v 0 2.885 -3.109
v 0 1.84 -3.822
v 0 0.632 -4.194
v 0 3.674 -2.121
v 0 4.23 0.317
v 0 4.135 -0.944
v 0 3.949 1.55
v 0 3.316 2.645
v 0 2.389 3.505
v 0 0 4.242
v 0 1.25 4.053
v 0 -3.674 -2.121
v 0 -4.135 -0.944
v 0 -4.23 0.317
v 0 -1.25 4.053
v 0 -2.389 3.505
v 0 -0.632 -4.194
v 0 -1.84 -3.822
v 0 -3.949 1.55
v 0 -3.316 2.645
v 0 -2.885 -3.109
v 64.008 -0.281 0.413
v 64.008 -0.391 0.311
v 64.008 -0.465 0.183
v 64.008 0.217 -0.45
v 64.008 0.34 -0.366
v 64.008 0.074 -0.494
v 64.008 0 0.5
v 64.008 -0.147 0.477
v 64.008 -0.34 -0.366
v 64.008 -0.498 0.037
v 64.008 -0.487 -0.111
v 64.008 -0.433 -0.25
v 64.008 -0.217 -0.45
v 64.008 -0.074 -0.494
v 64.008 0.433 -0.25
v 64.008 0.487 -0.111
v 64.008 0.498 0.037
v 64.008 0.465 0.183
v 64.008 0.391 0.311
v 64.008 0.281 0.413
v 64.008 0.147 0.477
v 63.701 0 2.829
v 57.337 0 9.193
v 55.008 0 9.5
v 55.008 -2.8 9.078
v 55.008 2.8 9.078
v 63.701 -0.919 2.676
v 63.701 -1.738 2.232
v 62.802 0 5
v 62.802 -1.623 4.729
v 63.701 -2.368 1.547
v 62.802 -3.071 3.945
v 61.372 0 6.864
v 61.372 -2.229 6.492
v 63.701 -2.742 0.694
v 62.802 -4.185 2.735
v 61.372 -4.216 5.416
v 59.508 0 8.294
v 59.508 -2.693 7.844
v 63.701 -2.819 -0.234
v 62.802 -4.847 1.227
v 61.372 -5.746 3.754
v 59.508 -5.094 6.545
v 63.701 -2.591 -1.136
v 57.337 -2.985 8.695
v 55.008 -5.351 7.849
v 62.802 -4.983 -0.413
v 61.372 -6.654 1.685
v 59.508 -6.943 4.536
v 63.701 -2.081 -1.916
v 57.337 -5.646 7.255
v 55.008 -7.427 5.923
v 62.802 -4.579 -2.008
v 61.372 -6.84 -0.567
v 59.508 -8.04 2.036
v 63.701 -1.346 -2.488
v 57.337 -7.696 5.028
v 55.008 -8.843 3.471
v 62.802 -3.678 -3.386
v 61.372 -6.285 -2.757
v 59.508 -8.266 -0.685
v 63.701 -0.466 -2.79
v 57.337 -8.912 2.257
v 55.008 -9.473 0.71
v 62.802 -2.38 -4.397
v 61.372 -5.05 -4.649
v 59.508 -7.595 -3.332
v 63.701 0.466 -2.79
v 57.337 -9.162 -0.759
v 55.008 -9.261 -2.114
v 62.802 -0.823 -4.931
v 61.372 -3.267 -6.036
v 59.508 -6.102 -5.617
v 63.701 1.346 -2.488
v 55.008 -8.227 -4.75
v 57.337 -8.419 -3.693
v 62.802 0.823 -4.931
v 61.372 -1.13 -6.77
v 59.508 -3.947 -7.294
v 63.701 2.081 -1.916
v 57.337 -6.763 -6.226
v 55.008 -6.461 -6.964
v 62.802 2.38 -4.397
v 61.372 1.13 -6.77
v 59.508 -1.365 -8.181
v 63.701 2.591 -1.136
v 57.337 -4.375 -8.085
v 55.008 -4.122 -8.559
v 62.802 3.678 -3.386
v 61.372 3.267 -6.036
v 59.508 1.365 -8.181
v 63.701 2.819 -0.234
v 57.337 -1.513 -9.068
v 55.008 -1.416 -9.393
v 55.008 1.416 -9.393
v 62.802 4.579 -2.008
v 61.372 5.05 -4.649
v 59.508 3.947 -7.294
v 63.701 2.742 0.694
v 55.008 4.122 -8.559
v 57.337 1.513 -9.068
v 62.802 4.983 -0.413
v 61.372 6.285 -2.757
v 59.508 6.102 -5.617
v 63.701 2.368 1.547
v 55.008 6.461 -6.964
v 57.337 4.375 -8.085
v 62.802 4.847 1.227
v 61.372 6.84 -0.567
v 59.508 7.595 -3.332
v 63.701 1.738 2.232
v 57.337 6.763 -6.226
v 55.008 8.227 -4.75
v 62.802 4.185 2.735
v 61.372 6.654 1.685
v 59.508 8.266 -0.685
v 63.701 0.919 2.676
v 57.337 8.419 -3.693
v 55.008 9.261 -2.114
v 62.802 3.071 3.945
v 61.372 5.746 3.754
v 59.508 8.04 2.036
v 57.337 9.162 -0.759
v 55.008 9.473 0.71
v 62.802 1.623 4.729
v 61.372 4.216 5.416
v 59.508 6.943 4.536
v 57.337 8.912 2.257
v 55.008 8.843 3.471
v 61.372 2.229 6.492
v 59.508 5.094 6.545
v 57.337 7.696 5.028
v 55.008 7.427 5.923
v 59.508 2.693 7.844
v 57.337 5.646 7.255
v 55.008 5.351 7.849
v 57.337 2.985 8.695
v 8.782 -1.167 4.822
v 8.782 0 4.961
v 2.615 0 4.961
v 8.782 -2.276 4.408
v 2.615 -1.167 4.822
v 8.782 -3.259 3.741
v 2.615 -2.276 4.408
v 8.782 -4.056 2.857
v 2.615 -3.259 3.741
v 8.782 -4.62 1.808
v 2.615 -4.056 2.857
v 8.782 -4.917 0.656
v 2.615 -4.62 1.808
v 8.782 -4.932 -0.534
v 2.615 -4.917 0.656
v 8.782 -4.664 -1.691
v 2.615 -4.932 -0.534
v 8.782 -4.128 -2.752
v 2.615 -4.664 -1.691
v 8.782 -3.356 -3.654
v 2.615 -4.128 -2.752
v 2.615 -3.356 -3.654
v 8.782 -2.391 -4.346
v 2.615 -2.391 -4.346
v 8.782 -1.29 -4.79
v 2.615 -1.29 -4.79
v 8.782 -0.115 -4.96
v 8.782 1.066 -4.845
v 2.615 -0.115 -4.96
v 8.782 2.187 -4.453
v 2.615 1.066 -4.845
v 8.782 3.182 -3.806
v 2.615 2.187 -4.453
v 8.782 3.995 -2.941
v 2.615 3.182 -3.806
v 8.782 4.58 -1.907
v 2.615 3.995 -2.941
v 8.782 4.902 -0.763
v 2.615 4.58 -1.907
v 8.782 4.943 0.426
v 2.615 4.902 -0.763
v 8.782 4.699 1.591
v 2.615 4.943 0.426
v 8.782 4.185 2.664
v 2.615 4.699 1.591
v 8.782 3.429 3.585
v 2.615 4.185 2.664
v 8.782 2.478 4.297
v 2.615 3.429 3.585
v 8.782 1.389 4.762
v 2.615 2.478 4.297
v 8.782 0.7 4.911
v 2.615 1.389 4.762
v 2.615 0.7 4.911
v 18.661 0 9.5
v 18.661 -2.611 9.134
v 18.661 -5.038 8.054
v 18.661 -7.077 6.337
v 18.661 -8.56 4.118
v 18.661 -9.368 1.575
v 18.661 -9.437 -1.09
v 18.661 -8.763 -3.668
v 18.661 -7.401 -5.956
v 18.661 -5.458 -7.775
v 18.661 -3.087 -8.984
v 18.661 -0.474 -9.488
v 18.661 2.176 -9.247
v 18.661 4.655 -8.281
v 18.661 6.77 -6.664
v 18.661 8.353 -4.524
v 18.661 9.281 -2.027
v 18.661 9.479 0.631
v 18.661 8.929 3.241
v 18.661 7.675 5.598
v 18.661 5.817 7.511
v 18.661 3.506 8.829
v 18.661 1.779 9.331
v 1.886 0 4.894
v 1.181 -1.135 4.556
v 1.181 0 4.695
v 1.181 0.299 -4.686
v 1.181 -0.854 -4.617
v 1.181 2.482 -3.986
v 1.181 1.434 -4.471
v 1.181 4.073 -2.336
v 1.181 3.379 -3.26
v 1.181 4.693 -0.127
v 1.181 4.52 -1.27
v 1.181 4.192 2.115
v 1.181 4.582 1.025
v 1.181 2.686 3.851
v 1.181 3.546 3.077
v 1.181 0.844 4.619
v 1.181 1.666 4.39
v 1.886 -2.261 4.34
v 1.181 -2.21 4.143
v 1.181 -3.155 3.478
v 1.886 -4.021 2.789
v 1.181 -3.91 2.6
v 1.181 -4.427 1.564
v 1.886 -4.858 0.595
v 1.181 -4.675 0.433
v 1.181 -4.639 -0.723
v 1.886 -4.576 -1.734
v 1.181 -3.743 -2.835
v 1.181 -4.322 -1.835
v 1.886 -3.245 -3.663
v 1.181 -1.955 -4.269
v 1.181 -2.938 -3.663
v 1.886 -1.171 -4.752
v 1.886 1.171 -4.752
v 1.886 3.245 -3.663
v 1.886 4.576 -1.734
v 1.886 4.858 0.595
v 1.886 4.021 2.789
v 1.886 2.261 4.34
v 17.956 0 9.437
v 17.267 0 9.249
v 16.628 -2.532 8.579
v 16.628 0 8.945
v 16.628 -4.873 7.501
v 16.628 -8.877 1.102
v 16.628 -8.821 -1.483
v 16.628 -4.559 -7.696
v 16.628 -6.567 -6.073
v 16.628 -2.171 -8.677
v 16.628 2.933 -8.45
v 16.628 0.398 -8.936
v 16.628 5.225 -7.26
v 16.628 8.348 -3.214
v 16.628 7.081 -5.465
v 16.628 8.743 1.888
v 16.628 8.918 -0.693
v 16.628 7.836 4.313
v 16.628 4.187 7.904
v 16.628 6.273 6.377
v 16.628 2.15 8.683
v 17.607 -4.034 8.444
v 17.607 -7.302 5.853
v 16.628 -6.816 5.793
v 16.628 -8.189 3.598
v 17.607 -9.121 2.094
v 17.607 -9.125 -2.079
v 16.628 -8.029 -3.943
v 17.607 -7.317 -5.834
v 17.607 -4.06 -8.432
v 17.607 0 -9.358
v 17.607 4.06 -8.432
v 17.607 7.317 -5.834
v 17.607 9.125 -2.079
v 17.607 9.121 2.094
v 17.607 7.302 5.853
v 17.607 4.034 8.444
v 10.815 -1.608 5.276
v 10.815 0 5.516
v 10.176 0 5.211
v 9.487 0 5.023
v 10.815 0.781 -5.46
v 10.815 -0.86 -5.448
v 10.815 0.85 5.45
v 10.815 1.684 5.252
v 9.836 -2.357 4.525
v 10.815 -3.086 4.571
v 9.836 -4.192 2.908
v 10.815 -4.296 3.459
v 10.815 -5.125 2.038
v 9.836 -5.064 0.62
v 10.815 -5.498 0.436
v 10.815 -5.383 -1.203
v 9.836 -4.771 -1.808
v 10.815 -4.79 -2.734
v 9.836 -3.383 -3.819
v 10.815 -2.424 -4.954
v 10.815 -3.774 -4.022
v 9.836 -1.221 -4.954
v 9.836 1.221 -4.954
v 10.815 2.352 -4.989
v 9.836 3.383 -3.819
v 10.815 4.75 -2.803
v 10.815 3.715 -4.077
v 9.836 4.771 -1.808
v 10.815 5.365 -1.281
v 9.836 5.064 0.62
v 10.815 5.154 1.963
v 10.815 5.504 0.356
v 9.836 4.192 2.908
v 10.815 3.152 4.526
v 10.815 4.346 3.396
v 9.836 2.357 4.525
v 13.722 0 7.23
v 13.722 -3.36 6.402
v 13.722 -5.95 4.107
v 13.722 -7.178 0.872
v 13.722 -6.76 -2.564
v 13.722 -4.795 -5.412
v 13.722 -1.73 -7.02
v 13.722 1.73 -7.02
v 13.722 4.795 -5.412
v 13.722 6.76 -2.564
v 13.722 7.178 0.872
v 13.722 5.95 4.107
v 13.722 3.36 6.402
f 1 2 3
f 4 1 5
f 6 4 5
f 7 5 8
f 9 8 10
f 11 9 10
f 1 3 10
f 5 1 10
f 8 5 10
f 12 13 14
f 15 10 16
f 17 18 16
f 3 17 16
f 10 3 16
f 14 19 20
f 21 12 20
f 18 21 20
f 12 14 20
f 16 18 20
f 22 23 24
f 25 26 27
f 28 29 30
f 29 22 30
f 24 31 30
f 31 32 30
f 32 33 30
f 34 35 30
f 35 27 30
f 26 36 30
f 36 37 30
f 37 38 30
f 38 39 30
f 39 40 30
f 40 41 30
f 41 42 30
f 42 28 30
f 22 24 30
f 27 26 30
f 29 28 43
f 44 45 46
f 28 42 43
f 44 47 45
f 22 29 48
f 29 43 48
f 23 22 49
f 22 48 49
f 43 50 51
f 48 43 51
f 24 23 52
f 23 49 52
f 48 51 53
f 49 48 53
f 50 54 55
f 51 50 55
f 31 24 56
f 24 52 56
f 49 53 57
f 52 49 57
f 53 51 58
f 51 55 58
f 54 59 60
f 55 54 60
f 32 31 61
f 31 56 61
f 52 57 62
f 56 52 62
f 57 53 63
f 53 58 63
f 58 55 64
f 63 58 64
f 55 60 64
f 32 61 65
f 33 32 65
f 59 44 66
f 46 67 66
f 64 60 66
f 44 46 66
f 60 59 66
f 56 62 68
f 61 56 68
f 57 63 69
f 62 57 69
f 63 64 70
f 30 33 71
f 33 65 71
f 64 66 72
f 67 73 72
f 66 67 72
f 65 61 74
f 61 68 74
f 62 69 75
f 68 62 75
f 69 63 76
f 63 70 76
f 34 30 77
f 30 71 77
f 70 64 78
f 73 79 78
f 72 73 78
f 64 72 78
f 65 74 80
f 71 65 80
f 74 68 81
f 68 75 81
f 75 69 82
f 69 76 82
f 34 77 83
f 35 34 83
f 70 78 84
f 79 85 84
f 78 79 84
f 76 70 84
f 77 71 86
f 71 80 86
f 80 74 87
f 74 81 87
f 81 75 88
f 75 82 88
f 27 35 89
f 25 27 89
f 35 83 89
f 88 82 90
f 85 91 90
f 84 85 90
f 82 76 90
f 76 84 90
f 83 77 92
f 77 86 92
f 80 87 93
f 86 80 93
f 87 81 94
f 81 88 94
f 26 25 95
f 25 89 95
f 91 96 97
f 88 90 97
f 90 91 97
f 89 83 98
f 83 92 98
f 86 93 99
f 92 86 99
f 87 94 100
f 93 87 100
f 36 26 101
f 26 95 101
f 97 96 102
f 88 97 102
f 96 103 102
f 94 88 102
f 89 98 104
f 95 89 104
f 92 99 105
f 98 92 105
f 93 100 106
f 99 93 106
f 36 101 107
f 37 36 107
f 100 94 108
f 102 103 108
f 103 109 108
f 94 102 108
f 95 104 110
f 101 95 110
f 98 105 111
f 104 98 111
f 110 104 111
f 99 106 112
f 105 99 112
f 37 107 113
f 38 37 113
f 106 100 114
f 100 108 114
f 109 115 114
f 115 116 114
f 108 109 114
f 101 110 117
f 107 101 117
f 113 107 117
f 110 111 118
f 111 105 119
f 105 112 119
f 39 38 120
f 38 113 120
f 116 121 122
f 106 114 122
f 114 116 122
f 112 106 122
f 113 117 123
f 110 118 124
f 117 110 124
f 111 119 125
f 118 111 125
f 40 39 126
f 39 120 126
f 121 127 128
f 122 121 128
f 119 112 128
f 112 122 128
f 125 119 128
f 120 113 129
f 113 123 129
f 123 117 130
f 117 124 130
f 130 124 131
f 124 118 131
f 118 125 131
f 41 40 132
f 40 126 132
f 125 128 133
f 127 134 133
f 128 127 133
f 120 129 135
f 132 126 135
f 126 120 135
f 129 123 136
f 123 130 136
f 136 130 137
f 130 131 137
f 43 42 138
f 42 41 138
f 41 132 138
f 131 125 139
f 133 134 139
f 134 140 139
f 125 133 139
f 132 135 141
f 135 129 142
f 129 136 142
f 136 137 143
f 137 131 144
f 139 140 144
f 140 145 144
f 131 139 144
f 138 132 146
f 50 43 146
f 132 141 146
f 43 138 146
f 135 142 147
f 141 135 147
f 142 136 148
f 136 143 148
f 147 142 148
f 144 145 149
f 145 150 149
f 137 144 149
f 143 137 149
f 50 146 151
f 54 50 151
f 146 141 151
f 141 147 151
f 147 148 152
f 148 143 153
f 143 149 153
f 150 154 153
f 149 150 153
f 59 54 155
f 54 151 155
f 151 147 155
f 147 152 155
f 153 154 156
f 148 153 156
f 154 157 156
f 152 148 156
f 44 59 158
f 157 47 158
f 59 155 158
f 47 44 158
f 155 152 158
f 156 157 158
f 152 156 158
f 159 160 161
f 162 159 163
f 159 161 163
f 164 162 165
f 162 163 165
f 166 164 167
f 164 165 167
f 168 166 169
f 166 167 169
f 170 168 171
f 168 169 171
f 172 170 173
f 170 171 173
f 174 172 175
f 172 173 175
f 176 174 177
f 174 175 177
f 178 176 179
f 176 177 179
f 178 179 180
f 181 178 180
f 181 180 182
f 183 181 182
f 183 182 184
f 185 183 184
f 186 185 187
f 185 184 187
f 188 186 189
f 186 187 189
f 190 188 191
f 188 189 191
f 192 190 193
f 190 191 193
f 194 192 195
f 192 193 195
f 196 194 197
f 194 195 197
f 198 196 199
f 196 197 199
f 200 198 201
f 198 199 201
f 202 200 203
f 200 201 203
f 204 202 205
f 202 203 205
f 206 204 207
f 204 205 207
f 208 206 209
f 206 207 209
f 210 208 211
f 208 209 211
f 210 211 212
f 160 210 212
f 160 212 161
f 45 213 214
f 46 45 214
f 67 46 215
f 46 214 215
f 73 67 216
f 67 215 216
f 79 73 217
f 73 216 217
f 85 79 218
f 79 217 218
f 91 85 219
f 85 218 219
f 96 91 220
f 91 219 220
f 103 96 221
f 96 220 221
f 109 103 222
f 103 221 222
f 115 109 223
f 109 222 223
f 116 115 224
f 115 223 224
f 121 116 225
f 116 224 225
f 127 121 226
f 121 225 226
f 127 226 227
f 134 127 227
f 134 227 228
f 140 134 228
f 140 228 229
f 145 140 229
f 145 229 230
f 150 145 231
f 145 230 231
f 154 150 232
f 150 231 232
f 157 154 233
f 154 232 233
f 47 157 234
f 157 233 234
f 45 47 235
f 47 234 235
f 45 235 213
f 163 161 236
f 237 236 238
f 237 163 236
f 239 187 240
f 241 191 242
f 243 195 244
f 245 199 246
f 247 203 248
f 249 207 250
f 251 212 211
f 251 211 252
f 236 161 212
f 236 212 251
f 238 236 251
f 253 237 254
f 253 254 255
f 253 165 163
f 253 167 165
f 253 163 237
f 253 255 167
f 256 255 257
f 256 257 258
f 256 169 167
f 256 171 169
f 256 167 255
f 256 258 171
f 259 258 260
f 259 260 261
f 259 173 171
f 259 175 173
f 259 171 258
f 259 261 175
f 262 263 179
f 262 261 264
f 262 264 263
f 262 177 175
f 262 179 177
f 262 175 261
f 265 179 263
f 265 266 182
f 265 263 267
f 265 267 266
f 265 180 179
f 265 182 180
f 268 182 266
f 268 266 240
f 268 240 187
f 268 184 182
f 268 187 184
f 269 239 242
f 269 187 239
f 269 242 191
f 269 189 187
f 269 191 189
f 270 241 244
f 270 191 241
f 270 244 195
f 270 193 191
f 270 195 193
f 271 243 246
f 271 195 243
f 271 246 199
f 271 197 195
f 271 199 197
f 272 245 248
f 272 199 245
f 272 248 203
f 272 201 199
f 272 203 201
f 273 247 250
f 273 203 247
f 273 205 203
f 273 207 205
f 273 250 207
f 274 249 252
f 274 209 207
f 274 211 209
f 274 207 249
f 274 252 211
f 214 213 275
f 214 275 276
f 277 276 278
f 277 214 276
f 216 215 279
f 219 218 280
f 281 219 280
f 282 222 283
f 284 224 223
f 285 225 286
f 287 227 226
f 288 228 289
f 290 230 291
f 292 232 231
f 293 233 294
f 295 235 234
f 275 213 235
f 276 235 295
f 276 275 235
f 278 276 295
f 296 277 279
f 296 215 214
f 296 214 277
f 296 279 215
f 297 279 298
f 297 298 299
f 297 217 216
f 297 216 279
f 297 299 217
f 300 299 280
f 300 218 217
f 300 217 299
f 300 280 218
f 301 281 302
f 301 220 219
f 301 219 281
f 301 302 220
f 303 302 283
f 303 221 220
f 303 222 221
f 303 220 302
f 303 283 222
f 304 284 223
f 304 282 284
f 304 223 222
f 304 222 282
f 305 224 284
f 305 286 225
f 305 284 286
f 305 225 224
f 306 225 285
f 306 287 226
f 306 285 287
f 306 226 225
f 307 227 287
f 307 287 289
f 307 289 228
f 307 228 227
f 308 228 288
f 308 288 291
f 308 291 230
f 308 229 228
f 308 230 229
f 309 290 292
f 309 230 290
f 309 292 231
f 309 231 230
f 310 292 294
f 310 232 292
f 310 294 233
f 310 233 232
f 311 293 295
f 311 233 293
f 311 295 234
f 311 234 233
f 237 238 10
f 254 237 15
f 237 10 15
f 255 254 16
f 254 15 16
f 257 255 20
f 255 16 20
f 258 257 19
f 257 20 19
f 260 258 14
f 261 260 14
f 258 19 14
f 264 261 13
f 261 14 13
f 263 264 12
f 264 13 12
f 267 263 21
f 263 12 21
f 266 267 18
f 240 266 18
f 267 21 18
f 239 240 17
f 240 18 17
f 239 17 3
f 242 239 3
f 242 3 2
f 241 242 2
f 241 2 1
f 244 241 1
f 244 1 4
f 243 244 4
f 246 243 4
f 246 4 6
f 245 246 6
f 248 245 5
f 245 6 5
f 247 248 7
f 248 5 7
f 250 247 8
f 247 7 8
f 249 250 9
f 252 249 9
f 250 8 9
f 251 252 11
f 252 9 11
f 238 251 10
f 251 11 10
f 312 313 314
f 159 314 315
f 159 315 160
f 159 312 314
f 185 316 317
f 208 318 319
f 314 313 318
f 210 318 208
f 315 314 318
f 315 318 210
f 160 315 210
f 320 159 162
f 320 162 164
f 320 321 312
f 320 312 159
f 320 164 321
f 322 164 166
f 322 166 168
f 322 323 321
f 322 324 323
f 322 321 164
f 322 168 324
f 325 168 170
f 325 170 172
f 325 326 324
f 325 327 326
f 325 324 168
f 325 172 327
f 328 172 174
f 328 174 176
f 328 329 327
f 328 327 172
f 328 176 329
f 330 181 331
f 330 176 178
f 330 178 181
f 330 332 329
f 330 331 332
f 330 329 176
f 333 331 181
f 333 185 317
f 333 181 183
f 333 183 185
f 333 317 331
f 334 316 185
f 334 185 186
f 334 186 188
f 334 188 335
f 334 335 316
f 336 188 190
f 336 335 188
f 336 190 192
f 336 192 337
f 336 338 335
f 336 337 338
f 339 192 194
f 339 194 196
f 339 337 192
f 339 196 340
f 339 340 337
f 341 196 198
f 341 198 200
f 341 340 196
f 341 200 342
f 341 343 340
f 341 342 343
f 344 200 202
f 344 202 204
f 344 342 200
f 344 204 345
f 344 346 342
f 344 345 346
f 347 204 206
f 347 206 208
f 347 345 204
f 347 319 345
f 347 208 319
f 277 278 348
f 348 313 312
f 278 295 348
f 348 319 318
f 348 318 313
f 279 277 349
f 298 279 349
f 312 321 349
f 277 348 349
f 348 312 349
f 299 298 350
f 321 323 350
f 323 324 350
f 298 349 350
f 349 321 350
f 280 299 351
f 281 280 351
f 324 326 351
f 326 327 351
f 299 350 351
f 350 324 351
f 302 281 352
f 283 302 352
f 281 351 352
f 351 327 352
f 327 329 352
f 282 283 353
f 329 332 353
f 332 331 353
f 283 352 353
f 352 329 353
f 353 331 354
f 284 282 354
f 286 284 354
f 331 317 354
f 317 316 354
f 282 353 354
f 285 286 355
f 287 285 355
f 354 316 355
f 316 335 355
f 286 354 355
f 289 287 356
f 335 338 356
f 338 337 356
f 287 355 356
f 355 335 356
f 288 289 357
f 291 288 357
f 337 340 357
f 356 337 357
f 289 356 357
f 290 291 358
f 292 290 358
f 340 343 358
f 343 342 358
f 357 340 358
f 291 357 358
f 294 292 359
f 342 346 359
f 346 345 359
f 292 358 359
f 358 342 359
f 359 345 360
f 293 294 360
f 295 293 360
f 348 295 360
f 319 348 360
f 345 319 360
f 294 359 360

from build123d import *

# Parameters (mm, degrees)
F2_R = 9
F3_R = 4


with BuildPart() as f1:
    # F0 (on Front) → F1 (revolve)
    with BuildSketch(Plane.XZ):
        Polygon((0, 1.822479), (0, 0), (64.008, 0), (64.008, 9.4996), (57.568784, 9.4996), (17.568784, 9.4996), (9.874334, 4.96087), (1.873334, 4.96087), (0, 4.2418), align=None)
    revolve(axis=Axis((32.004, 0, 0), (1, 0, 0)))

    # F2
    f2_edges = [f1.edges().sort_by_distance(p)[0] for p in [
        (64.008, 0, -9.4996),
    ]]
    fillet(f2_edges, radius=F2_R)

    # F3
    f3_edges = [f1.edges().sort_by_distance(p)[0] for p in [
        (17.568784, 0, -9.4996),
        (9.874334, 0, -4.96087),
        (1.873334, 0, -4.96087),
    ]]
    fillet(f3_edges, radius=F3_R)


solid = f1.part
